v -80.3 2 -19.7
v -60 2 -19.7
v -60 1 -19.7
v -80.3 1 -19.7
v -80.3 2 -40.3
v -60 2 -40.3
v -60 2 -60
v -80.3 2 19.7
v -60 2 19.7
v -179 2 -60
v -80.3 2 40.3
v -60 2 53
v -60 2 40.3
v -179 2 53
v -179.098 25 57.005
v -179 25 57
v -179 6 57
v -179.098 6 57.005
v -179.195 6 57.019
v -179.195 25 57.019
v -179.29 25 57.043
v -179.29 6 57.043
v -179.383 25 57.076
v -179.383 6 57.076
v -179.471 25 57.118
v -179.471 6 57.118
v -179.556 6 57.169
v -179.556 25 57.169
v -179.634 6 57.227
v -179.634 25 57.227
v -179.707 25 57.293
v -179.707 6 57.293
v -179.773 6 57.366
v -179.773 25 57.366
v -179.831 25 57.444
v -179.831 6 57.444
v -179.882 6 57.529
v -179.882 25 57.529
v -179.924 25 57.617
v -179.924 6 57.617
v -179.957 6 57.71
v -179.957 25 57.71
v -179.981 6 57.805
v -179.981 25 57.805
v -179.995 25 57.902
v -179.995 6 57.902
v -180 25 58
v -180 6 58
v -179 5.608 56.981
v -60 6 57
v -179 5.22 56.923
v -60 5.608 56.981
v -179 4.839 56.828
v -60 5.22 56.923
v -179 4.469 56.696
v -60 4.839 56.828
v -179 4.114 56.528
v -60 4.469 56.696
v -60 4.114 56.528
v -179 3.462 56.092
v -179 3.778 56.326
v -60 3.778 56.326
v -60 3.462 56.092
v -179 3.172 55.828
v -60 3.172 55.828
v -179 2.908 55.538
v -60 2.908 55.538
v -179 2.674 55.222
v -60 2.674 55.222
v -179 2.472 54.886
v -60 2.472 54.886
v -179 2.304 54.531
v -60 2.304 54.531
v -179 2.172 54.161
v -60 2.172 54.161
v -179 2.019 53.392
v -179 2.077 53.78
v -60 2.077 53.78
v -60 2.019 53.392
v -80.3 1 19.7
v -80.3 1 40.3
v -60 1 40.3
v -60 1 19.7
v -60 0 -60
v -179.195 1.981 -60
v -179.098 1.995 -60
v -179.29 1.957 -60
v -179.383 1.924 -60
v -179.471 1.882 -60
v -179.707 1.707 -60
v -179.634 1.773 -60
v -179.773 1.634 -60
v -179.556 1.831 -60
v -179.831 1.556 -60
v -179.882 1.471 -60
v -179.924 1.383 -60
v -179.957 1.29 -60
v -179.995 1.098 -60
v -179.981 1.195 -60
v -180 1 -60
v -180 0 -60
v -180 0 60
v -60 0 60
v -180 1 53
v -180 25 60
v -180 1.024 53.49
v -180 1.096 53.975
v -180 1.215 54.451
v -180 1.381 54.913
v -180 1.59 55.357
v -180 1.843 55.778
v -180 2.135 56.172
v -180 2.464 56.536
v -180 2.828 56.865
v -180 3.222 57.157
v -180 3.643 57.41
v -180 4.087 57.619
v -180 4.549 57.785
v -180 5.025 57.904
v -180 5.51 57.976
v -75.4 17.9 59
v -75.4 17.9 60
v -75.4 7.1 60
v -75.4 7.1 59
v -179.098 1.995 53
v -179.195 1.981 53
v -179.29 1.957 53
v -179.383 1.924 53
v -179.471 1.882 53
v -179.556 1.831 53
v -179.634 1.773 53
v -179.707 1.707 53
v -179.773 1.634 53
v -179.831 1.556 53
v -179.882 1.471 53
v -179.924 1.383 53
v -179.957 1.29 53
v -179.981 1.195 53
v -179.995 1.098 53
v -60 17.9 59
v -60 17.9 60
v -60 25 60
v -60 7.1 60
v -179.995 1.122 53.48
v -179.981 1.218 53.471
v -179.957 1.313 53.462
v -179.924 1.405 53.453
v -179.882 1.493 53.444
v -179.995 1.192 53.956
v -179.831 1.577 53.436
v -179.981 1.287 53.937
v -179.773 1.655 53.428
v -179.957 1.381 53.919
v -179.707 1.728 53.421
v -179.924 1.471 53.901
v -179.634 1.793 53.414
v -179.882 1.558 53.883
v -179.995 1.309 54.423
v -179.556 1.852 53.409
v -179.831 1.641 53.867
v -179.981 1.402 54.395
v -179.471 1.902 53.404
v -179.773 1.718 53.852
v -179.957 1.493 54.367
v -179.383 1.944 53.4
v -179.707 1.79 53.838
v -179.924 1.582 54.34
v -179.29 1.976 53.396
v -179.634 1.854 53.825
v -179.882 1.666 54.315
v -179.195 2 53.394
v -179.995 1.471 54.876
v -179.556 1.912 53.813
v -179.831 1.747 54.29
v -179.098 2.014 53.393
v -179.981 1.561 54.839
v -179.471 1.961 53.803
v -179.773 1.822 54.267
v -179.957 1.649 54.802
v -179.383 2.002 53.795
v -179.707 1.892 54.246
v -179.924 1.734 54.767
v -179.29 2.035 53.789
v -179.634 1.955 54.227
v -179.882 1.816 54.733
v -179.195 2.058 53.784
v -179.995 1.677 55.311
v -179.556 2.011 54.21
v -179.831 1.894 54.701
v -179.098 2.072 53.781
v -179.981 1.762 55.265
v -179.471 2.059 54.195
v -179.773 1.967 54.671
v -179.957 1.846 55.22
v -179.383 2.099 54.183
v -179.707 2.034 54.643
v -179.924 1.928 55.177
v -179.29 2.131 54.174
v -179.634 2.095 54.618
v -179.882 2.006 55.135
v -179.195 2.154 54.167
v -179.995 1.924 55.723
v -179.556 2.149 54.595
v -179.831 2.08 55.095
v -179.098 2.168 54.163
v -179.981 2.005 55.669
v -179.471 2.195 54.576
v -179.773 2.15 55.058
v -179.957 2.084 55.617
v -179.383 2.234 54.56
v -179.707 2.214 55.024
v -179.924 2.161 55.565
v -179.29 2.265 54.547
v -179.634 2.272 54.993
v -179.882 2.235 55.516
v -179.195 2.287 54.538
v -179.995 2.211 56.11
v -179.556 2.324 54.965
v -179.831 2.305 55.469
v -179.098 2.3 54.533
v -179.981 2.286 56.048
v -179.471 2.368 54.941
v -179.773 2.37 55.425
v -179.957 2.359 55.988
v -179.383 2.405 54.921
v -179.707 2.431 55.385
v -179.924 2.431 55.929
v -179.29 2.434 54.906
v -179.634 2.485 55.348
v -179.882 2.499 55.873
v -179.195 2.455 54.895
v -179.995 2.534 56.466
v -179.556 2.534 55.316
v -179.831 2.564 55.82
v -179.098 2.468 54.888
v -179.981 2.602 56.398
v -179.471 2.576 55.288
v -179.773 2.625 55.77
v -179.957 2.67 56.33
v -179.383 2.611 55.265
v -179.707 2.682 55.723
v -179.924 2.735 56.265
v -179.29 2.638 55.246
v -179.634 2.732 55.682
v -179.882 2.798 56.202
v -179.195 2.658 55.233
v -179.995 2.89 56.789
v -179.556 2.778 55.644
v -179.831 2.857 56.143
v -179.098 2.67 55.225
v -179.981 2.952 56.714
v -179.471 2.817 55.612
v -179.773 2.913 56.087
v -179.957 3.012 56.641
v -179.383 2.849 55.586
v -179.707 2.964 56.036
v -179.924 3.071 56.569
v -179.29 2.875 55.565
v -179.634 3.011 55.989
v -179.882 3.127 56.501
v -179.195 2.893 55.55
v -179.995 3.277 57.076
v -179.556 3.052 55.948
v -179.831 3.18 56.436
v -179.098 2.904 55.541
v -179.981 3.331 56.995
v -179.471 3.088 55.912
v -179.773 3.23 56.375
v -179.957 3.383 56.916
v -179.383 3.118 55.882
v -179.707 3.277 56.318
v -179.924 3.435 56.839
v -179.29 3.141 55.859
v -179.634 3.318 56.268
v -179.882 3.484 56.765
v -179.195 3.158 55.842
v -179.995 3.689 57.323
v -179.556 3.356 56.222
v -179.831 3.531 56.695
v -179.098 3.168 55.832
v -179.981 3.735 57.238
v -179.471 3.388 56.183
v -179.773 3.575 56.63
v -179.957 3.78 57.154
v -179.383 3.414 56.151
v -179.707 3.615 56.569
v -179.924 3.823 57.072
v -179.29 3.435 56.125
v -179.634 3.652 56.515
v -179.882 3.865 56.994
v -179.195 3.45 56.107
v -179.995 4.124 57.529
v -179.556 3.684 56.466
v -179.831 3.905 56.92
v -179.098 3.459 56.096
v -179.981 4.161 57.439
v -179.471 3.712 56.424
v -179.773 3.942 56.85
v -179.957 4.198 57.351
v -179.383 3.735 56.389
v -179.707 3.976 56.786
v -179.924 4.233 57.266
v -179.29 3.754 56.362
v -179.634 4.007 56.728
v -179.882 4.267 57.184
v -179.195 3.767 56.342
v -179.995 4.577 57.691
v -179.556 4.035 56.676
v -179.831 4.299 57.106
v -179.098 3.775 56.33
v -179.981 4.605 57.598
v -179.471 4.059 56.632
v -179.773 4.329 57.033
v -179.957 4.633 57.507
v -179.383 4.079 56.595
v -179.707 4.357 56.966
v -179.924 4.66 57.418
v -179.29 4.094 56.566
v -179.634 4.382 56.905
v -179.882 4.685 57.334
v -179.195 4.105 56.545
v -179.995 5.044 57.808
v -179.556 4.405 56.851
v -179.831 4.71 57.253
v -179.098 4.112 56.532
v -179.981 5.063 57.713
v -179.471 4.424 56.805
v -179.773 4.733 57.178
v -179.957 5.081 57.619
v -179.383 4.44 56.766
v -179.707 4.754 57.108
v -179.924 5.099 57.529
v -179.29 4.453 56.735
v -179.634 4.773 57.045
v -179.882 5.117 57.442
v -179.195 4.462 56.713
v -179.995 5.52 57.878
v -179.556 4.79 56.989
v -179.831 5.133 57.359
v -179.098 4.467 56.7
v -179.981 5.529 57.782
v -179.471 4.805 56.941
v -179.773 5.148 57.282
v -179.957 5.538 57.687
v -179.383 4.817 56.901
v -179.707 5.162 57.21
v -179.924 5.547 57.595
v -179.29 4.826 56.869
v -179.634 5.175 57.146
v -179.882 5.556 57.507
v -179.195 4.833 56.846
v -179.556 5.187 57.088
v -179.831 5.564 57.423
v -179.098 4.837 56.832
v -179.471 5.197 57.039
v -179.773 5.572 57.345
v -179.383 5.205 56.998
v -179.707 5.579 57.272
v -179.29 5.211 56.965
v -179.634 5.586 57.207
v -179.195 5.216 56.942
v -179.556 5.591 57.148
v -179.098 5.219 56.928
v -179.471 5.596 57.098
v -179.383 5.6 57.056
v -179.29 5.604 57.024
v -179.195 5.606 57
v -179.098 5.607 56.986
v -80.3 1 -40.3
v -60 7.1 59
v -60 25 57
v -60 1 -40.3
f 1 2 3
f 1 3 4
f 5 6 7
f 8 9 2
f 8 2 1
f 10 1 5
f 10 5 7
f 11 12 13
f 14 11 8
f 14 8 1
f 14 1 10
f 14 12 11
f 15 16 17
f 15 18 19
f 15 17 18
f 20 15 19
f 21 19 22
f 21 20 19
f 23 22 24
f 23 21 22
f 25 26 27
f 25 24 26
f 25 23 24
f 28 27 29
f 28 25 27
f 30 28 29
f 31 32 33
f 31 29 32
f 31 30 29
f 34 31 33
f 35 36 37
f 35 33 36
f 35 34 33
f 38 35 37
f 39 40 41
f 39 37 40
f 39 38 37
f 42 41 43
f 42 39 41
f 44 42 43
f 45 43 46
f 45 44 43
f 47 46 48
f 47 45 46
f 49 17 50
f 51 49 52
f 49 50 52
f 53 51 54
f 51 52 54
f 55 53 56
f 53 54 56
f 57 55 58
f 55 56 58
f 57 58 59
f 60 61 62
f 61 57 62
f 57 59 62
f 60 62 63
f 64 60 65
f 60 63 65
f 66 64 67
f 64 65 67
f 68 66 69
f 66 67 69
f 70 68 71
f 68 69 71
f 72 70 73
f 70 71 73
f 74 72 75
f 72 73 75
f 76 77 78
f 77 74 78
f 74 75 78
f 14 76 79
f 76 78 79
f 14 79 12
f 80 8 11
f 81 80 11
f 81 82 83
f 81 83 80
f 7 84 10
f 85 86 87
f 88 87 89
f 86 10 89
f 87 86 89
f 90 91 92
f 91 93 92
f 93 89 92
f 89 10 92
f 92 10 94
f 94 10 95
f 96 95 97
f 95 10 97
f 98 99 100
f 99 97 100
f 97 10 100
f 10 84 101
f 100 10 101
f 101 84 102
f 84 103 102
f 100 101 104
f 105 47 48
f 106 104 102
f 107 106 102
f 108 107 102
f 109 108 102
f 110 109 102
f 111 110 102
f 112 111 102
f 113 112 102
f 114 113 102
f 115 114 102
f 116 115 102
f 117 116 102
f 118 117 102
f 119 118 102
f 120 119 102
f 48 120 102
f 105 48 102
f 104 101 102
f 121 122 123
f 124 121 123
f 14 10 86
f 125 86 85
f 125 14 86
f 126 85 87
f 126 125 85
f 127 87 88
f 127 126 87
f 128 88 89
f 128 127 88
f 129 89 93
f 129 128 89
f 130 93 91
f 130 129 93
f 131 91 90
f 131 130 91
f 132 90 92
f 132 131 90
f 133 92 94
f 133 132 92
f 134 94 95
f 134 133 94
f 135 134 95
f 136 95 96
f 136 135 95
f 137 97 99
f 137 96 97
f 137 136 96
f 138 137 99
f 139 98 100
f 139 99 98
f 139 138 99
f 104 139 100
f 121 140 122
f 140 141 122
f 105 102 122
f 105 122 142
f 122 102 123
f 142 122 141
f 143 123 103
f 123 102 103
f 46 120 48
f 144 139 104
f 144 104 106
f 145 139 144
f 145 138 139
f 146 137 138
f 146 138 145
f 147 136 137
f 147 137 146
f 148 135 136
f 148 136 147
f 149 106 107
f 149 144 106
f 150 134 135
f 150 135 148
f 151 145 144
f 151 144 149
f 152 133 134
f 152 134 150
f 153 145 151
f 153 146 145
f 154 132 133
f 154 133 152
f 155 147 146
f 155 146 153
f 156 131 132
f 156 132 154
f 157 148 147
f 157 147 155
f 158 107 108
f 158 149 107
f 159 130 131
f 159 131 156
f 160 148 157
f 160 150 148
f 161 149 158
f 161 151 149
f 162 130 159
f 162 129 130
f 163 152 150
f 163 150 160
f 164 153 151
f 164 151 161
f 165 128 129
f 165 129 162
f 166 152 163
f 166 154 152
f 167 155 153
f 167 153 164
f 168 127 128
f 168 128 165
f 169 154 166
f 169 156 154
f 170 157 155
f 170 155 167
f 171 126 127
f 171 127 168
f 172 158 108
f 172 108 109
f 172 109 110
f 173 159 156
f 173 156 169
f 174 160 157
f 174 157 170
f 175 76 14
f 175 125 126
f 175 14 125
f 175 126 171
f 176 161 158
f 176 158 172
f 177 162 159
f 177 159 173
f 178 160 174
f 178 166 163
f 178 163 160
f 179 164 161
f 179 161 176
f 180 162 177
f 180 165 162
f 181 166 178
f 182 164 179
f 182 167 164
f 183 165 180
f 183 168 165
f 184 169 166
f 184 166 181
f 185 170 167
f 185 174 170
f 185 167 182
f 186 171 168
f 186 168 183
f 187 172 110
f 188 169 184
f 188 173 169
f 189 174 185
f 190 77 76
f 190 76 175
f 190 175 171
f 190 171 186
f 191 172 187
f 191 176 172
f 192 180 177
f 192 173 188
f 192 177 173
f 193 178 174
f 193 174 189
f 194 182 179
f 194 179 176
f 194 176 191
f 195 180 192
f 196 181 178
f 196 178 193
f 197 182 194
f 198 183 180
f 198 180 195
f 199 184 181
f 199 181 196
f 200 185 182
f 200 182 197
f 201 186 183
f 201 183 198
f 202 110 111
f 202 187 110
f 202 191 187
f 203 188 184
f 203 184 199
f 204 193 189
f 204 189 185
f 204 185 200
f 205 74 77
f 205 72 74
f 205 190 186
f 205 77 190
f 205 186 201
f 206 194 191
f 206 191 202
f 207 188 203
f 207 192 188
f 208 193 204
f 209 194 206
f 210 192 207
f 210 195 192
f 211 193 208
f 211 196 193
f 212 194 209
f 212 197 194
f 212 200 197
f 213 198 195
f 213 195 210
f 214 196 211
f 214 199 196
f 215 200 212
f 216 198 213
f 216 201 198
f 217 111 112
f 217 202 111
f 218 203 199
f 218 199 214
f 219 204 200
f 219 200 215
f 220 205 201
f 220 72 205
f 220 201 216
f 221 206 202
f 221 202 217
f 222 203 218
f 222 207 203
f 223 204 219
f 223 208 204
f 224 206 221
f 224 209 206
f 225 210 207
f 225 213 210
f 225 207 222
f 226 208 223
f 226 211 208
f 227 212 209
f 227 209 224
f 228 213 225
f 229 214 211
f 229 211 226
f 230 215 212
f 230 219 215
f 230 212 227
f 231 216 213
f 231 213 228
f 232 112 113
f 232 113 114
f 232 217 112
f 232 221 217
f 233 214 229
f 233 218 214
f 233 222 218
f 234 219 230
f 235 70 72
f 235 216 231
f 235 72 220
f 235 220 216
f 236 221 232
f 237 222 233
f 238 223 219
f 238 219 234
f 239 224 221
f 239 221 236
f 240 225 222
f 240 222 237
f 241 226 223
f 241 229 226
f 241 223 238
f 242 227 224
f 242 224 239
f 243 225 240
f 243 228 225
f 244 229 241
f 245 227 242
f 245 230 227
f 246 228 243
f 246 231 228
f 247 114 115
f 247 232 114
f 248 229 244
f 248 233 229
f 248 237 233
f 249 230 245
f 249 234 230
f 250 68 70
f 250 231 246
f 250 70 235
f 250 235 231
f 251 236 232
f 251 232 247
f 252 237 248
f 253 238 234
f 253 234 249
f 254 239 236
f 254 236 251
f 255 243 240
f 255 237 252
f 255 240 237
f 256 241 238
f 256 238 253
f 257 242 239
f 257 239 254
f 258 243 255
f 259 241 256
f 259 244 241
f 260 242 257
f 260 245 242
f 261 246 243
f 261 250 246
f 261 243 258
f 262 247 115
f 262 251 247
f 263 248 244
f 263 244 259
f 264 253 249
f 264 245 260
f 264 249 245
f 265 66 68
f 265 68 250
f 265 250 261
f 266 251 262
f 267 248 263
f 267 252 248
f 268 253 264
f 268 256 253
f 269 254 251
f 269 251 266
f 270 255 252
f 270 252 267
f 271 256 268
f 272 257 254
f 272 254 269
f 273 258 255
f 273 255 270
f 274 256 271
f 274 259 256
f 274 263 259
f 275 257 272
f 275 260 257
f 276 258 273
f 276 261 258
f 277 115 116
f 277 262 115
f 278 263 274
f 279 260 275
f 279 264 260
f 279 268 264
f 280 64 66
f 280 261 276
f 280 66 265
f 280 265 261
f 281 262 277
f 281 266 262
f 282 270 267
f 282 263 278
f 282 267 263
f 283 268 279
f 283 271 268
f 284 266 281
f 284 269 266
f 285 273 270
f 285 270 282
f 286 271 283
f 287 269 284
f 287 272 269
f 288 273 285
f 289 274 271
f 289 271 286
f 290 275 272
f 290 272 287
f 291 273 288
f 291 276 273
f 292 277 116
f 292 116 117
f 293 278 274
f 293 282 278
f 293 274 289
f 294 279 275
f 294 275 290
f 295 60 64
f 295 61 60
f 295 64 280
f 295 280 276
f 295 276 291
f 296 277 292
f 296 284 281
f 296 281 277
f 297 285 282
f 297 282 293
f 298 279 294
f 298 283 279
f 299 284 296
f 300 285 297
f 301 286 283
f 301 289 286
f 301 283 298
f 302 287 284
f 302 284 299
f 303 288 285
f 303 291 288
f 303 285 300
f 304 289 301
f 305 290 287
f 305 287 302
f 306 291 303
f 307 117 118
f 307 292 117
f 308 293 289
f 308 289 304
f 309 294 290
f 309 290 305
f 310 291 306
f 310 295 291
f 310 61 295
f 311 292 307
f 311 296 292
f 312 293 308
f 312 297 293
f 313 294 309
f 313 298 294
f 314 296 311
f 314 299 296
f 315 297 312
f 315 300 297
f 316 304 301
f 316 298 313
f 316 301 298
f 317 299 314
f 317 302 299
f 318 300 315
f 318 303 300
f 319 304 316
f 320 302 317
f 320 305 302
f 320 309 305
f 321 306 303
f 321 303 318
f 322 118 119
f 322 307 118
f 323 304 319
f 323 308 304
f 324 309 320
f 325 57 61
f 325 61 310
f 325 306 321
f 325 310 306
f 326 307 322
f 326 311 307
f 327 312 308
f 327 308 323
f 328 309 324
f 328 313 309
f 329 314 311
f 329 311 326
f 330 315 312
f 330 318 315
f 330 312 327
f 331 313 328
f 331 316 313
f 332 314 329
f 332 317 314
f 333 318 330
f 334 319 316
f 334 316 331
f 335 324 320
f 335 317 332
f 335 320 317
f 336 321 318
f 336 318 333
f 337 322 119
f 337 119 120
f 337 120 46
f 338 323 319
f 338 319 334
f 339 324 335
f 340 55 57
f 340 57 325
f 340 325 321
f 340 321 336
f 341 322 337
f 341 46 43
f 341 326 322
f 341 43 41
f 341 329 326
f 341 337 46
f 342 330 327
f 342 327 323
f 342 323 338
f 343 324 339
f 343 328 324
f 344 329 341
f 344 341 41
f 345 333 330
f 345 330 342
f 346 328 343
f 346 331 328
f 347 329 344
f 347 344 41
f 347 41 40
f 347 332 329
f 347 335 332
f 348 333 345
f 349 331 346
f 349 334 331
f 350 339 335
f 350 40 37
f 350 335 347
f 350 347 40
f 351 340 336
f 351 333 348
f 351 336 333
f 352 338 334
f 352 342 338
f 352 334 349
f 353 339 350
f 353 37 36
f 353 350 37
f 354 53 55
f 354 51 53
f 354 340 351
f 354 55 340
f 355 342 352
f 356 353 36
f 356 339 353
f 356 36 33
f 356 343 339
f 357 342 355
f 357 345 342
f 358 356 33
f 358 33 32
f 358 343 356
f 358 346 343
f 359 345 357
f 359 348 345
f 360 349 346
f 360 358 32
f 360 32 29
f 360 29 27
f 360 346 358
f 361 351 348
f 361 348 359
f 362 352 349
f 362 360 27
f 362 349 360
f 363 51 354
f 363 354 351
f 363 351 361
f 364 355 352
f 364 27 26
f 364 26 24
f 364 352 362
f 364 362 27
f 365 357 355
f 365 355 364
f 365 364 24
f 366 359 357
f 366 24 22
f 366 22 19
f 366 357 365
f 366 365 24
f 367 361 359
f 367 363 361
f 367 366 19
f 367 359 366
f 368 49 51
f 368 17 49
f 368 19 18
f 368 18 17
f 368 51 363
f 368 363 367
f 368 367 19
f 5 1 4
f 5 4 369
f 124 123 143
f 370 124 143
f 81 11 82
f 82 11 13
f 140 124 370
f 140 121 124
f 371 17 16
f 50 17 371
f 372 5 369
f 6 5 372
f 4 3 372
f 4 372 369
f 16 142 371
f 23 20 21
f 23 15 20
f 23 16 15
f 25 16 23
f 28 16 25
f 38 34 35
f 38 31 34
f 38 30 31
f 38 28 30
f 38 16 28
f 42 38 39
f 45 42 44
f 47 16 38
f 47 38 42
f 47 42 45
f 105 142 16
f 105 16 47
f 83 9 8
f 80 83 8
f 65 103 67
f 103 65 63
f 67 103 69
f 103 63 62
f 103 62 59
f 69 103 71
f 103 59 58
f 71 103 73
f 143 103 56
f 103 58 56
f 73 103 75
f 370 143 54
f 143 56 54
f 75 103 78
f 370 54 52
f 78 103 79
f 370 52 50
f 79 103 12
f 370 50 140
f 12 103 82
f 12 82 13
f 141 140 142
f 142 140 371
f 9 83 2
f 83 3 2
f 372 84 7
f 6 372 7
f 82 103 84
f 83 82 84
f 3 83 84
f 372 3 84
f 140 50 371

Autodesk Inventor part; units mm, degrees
ref_plane "YZ Plane" through (0, 0, 0) normal (1, 0, 0) x (0, 1, 0)
ref_plane "XZ Plane" through (0, 0, 0) normal (0, 1, 0) x (-1, 0, 0)
ref_plane "XY Plane" through (0, 0, 0) normal (0, 0, 1) x (1, 0, 0)
sketch "スケッチ1" plane through (0, 0, 0) normal (0, 1, 0) x (-1, 0, 0)
  line L0 (180, 60) -> (-180, 60)
  line L1 (-180, 60) -> (-180, -60)
  line L2 (-180, -60) -> (180, -60)
  line L3 (180, -60) -> (180, 60)
  line L4 (180, 60) -> (-180, -60) construction
  line L5 (-180, 60) -> (180, -60) construction
  line L6 (180, 57) -> (-180, 57)
  line L7 (-60, 60) -> (-60, -60)
  line L8 (-60, 40) -> (-80, 40)
  line L9 (-80, 40) -> (-80, 20)
  line L10 (-80, 20) -> (-60, 20)
  line L11 (252, 0) -> (-252, 0) construction
  line L12 (-60, -40) -> (-80, -40)
  line L13 (-80, -40) -> (-80, -20)
  line L14 (-80, -20) -> (-60, -20)
  line L15 (0, -84) -> (0, 84) construction
  line L16 (60, 60) -> (60, -60)
  line L17 (60, 40) -> (80, 40)
  line L18 (80, 40) -> (80, 20)
  line L19 (80, 20) -> (60, 20)
  line L20 (60, -40) -> (80, -40)
  line L21 (80, -20) -> (60, -20)
  line L22 (80, -40) -> (80, -20)
  line L23 (-60, 19.7) -> (-80.3, 19.7)
  line L24 (-80.3, 19.7) -> (-80.3, 40.3)
  line L25 (-80.3, 40.3) -> (-60, 40.3)
  line L26 (-60, -19.7) -> (-80.3, -19.7)
  line L27 (-80.3, -19.7) -> (-80.3, -40.3)
  line L28 (-80.3, -40.3) -> (-60, -40.3)
  line L29 (60, 19.7) -> (80.3, 19.7)
  line L30 (80.3, 19.7) -> (80.3, 40.3)
  line L31 (80.3, 40.3) -> (60, 40.3)
  line L32 (60, -19.7) -> (80.3, -19.7)
  line L33 (80.3, -19.7) -> (80.3, -40.3)
  line L34 (80.3, -40.3) -> (60, -40.3)
  point P0 (0, 0)
  point P1 (60, 57)
  dimension "d0" = 120
  dimension "d1" = 360
  dimension "d4" = 3
  dimension "d5" = 120
  dimension "d7" = 20
  dimension "d8" = 20
  dimension "d9" = 20
  dimension "d10" = 0.3
  dimension "d11" = 0.3
extrude "押し出し3" add sketch "スケッチ1" along normal blind 25 contours L3 L6 L16 L0 | L16 L6 L7 L0 | L7 L6 L1 L0
sketch "スケッチ2" plane through (-180, 0, 60) normal (0, 0, 1) x (1, 0, 0)
  line L0 (0, 0) -> (360, 0) projected
  line L1 (360, 0) -> (360, 25) projected
  line L2 (0, 25) -> (360, 25) projected
  line L3 (0, 0) -> (0, 25) projected
  line L4 (240, 0) -> (240, 25)
  line L5 (240, 7.5) -> (255, 7.5)
  line L6 (255, 7.5) -> (255, 17.5)
  line L7 (255, 17.5) -> (240, 17.5)
  line L8 (180, -5) -> (180, 30) construction
  line L9 (120, 0) -> (120, 25)
  line L10 (120, 7.5) -> (105, 7.5)
  line L11 (105, 7.5) -> (105, 17.5)
  line L12 (105, 17.5) -> (120, 17.5)
  line L13 (240, 17.9) -> (255.4, 17.9)
  line L14 (255.4, 17.9) -> (255.4, 7.1)
  line L15 (255.4, 7.1) -> (240, 7.1)
  line L16 (120, 17.9) -> (104.6, 17.9)
  line L17 (104.6, 17.9) -> (104.6, 7.1)
  line L18 (104.6, 7.1) -> (120, 7.1)
  point P0 (180, 0)
  point P1 (360, 12.5)
  dimension "d16" = 120
  dimension "d17" = 10
  dimension "d18" = 15
  dimension "d19" = 7.5
  dimension "d24" = 0.4
extrude "押し出し6" add sketch "スケッチ1" along normal blind 2 contours L3 L2 L16 L34 L33 L32 L29 L30 L31 L6 | L31 L30 L29 L16 L19 L18 L17 | L17 L18 L19 L16 | L16 L20 L22 L21 L32 L33 L34 | L16 L21 L22 L20
extrude "押し出し7" cut sketch "スケッチ2" along normal up to surface (3 mm away) from surface at -3 contours L9 L2 L4 L0 | L4 L15 L14 L13 L2 L1 L0 | L4 L5 L6 L7 L13 L14 L15 | L4 L7 L6 L5
extrude "押し出し8" cut sketch "スケッチ2" against normal blind 1 contours L18 L17 L16 L9 L12 L11 L10 | L10 L11 L12 L9
extrude "押し出し9" cut sketch "スケッチ1" against normal blind 1 from surface at 2 contours L31 L30 L29 L16 L19 L18 L17 | L17 L18 L19 L16 | L16 L20 L22 L21 L32 L33 L34 | L16 L21 L22 L20
fillet "フィレット3" radius 4 1 edges at (-120, 2, 57)
fillet "フィレット4" radius 1 2 edges at (-180, 15.5, 57) (-180, 2, -3.5)
properties part number "protectar1"
